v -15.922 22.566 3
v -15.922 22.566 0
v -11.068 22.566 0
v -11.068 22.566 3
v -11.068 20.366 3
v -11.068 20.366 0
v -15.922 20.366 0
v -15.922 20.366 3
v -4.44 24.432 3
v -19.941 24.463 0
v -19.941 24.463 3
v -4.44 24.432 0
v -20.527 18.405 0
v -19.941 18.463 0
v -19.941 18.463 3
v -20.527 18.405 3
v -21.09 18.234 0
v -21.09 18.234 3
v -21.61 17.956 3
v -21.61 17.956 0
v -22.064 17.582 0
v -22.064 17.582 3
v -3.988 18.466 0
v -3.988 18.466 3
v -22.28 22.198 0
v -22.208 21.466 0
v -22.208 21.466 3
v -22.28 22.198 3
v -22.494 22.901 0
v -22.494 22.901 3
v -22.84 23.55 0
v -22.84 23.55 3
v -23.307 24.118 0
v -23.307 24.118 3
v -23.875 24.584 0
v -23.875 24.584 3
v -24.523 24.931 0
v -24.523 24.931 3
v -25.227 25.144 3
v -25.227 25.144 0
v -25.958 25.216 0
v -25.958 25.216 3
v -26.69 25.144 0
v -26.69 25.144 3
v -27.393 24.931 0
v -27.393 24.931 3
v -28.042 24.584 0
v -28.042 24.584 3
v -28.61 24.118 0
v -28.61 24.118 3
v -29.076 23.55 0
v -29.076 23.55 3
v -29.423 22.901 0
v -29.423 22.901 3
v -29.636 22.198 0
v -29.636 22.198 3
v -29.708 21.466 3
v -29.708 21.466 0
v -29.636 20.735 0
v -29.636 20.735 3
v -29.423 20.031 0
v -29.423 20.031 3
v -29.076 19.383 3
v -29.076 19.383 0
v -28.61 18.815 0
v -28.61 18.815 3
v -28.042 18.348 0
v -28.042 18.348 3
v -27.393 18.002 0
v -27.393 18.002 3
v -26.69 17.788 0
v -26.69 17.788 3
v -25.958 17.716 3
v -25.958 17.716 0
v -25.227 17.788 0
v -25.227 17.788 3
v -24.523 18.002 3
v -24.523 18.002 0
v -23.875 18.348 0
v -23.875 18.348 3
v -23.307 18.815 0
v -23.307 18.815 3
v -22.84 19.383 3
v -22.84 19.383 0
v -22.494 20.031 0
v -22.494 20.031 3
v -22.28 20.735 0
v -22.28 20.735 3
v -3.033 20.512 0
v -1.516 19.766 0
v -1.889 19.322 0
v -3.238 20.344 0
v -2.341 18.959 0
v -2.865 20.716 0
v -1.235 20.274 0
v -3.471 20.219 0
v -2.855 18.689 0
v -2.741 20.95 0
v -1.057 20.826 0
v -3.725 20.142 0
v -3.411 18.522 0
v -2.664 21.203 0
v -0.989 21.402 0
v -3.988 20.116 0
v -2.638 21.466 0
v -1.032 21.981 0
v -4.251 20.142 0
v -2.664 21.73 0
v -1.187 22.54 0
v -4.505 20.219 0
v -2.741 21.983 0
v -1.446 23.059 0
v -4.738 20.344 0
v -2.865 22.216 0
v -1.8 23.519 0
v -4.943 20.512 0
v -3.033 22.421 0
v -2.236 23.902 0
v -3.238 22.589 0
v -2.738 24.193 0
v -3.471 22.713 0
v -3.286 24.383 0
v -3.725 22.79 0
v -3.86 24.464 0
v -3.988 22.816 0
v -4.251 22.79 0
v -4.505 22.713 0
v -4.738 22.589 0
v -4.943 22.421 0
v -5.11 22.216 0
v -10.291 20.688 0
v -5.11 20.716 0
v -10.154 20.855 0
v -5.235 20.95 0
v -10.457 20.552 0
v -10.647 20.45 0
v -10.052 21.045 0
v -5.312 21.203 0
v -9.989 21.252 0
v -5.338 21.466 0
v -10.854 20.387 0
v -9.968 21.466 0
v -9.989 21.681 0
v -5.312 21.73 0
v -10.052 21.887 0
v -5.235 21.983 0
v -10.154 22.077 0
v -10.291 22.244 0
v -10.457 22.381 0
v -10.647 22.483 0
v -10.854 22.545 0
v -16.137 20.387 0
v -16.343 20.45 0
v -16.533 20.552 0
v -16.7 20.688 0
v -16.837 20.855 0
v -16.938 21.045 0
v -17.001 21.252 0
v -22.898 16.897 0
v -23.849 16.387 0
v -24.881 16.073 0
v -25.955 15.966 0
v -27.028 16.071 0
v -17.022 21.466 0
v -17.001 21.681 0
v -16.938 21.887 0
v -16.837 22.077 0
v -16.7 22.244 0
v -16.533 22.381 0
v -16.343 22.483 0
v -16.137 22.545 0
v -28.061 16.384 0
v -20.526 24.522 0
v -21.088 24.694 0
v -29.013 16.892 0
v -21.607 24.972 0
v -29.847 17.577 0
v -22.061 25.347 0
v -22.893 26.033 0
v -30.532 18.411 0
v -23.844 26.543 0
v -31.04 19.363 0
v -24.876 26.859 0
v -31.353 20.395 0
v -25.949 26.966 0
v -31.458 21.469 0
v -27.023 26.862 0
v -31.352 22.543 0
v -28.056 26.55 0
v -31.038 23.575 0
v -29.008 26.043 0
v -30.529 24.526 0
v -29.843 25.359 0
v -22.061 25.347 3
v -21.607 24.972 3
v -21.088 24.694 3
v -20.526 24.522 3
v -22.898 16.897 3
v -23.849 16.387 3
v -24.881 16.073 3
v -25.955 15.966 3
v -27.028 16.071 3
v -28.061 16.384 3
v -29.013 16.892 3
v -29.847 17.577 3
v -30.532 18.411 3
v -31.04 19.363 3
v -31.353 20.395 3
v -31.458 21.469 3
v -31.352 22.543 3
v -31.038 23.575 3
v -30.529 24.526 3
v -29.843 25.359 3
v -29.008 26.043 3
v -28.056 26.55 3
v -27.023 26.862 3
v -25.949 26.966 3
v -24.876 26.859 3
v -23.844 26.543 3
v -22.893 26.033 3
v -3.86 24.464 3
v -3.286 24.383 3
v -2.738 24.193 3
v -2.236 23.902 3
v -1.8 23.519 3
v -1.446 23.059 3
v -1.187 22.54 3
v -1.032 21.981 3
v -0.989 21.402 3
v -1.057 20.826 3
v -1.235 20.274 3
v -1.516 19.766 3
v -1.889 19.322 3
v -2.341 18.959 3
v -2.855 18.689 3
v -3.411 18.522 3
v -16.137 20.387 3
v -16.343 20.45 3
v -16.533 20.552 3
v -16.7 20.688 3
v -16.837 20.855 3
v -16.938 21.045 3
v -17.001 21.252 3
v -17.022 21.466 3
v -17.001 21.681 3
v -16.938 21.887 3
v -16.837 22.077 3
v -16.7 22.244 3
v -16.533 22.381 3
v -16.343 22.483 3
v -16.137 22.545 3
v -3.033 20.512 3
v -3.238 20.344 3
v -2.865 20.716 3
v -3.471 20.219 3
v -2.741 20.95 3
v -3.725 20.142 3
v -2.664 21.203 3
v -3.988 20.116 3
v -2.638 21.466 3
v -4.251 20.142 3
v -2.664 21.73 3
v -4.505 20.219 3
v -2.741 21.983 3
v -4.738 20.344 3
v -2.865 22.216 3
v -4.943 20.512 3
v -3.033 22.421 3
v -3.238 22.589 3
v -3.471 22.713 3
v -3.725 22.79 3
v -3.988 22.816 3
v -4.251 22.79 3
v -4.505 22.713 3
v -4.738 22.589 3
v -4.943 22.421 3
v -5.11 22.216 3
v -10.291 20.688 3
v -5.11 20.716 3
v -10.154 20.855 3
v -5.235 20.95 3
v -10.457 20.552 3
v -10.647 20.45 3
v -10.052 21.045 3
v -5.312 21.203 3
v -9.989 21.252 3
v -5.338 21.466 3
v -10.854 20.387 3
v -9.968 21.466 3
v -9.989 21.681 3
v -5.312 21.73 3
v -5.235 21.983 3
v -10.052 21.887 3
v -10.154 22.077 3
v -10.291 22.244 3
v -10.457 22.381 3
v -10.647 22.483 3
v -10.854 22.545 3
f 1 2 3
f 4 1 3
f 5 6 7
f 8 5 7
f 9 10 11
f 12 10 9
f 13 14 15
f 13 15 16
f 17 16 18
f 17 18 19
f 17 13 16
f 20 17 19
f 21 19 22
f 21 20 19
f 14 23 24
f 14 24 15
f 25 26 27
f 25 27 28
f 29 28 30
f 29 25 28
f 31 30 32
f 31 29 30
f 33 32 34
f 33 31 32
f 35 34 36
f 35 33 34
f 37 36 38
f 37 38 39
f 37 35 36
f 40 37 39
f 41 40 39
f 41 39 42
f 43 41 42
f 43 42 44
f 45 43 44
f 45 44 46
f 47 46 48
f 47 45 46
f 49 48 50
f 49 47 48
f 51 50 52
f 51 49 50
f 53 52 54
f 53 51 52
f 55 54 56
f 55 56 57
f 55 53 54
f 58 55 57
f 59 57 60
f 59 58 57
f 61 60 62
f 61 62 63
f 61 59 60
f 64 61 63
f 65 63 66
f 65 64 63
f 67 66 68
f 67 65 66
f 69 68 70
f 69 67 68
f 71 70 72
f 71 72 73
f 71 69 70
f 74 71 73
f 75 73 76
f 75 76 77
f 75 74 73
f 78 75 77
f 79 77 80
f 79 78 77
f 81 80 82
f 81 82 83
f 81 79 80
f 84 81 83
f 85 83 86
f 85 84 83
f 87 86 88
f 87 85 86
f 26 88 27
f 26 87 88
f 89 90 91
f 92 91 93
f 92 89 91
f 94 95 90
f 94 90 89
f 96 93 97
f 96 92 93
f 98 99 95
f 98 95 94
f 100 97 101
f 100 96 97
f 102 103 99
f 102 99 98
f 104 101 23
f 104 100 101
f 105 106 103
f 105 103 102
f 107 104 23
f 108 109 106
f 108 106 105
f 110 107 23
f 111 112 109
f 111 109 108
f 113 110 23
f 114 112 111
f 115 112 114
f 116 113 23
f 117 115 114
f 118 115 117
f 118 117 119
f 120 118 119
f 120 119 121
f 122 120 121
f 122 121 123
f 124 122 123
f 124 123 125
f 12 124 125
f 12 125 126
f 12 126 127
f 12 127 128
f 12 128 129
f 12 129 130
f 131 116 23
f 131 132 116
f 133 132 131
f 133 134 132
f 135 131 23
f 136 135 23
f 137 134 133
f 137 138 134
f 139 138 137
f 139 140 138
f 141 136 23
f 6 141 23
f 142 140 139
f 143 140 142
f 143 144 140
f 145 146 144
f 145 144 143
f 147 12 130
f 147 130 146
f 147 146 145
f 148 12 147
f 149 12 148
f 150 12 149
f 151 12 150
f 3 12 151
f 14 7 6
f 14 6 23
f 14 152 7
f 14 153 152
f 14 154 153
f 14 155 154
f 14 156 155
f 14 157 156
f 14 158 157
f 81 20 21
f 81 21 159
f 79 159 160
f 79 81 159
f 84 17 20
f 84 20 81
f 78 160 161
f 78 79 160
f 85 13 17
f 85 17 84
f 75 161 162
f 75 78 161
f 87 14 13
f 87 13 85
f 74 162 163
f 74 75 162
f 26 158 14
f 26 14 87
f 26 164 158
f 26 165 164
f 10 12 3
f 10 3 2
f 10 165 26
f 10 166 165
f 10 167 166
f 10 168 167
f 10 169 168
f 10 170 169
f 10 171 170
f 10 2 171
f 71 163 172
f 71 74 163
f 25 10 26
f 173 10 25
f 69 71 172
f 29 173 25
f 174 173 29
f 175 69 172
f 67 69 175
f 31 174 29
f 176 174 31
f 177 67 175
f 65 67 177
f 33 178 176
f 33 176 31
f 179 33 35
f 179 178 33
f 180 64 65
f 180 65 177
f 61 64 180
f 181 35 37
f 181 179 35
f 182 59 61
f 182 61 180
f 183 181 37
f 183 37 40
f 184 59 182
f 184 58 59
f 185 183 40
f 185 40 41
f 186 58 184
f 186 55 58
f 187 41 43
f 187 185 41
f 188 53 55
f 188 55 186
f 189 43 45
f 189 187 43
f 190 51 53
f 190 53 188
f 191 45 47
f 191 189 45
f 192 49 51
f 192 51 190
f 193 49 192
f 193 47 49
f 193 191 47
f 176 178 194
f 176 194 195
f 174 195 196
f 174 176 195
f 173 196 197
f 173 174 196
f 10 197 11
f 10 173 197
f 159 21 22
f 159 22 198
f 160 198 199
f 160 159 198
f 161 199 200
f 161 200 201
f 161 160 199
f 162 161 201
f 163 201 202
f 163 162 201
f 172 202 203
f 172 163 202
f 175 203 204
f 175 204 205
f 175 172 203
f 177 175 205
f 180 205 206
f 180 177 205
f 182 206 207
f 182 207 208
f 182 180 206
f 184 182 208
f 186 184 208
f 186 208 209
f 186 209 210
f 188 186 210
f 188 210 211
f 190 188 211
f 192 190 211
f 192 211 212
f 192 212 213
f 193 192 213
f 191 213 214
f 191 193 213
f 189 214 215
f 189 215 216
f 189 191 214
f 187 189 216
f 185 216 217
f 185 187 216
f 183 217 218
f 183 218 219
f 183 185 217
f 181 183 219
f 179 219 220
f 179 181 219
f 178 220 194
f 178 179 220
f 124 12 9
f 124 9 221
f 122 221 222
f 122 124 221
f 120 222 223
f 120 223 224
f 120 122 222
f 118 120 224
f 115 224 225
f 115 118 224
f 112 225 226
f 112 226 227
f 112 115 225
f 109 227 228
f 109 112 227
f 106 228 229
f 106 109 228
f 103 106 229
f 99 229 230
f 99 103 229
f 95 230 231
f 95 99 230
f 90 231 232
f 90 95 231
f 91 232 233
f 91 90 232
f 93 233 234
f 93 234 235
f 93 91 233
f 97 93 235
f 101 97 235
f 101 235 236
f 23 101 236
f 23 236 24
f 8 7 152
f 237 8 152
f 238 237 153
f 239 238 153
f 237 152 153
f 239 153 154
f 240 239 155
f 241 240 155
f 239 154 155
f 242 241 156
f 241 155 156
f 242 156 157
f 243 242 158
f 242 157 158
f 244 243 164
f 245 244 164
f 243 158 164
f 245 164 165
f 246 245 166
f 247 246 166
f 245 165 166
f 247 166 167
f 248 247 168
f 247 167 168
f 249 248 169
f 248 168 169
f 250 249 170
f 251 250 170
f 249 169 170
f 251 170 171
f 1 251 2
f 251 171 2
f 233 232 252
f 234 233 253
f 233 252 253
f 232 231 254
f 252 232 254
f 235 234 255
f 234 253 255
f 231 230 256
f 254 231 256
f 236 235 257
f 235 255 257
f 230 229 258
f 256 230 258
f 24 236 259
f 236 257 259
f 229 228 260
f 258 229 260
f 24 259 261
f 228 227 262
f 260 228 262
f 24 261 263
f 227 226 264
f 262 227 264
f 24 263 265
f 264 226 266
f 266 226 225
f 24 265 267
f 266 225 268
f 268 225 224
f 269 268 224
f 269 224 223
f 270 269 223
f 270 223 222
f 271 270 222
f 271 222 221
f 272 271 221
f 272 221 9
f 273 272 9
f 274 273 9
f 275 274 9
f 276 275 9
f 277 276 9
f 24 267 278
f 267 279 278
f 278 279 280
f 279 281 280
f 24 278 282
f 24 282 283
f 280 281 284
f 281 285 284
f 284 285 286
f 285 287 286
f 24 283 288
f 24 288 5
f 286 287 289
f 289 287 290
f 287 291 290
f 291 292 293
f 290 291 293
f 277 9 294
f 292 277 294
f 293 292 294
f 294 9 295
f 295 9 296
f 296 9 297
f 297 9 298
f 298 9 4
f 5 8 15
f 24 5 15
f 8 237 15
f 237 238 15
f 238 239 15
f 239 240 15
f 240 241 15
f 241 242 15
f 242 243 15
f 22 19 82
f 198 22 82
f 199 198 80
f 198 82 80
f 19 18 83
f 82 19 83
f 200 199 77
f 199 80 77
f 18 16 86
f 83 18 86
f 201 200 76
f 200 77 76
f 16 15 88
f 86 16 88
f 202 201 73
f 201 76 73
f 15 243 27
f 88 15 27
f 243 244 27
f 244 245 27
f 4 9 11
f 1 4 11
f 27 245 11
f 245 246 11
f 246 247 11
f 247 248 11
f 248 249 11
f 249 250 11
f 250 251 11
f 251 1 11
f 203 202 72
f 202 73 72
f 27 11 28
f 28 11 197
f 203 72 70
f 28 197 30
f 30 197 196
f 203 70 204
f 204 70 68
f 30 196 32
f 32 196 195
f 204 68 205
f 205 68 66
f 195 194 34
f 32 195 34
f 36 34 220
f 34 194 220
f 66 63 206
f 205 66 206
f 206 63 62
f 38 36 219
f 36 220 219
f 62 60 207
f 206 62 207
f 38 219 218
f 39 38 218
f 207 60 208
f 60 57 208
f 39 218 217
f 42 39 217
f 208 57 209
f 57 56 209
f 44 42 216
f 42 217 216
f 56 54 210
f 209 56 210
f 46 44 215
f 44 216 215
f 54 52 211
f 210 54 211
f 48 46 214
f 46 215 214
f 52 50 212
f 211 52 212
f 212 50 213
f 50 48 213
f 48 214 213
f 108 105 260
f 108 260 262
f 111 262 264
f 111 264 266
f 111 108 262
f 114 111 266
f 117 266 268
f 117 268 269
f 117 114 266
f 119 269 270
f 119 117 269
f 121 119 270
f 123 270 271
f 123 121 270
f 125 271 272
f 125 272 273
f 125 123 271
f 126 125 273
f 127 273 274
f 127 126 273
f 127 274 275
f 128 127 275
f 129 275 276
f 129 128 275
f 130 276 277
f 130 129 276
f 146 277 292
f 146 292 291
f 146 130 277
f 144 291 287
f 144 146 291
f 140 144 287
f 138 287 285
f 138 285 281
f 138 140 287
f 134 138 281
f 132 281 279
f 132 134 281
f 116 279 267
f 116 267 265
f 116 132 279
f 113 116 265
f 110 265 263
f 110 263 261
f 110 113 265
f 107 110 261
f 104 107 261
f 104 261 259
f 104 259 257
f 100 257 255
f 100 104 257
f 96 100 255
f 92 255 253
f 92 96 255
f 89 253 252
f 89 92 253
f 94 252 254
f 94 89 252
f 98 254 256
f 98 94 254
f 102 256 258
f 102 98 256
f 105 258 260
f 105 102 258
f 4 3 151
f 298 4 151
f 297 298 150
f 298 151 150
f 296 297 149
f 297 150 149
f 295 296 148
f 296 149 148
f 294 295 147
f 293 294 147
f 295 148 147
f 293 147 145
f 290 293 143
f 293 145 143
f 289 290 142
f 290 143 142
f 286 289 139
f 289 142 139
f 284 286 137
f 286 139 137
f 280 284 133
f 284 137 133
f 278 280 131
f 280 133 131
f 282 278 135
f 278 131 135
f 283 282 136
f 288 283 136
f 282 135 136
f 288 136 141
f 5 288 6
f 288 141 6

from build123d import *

# Parameters (mm, degrees)
ESQUISSE6_R        = 1.35
ESQUISSE6_R_2      = 3.75
BOSS_EXTRU_6_DEPTH = 3


with BuildPart() as part:
    # Esquisse6 → Boss.-Extru.6 (new body)
    with BuildSketch(Plane.XY):
        with BuildLine():
            Line((-3.987977269, 18.466237455), (-19.940968623, 18.463296912))
            ThreePointArc((-19.940968623, 18.463296912), (-21.090441726, 18.234116339), (-22.064368184, 17.581981843))
            ThreePointArc((-22.064368184, 17.581981843), (-31.458280506, 21.468938246), (-22.060555312, 25.346666961))
            ThreePointArc((-22.060555312, 25.346666961), (-21.088444228, 24.694065374), (-19.940566739, 24.46327096))
            Line((-19.940566739, 24.46327096), (-4.439636922, 24.432043174))
            ThreePointArc((-4.439636922, 24.432043174), (-0.996538054, 21.692713553), (-3.987977269, 18.466237455))
        make_face()
        with Locations((-3.987977269, 21.466237455)):
            Circle(ESQUISSE6_R, mode=Mode.SUBTRACT)
        with Locations((-25.958281169, 21.466237455)):
            Circle(ESQUISSE6_R_2, mode=Mode.SUBTRACT)
        with BuildLine():
            Line((-15.92195018, 22.566237455), (-11.068355584, 22.566237455))
            ThreePointArc((-11.068355584, 22.566237455), (-9.968355584, 21.466237455), (-11.068355584, 20.366237455))
            Line((-11.068355584, 20.366237455), (-15.92195018, 20.366237455))
            ThreePointArc((-15.92195018, 20.366237455), (-17.02195018, 21.466237455), (-15.92195018, 22.566237455))
        make_face(mode=Mode.SUBTRACT)
    extrude(amount=BOSS_EXTRU_6_DEPTH)


solid = part.part
